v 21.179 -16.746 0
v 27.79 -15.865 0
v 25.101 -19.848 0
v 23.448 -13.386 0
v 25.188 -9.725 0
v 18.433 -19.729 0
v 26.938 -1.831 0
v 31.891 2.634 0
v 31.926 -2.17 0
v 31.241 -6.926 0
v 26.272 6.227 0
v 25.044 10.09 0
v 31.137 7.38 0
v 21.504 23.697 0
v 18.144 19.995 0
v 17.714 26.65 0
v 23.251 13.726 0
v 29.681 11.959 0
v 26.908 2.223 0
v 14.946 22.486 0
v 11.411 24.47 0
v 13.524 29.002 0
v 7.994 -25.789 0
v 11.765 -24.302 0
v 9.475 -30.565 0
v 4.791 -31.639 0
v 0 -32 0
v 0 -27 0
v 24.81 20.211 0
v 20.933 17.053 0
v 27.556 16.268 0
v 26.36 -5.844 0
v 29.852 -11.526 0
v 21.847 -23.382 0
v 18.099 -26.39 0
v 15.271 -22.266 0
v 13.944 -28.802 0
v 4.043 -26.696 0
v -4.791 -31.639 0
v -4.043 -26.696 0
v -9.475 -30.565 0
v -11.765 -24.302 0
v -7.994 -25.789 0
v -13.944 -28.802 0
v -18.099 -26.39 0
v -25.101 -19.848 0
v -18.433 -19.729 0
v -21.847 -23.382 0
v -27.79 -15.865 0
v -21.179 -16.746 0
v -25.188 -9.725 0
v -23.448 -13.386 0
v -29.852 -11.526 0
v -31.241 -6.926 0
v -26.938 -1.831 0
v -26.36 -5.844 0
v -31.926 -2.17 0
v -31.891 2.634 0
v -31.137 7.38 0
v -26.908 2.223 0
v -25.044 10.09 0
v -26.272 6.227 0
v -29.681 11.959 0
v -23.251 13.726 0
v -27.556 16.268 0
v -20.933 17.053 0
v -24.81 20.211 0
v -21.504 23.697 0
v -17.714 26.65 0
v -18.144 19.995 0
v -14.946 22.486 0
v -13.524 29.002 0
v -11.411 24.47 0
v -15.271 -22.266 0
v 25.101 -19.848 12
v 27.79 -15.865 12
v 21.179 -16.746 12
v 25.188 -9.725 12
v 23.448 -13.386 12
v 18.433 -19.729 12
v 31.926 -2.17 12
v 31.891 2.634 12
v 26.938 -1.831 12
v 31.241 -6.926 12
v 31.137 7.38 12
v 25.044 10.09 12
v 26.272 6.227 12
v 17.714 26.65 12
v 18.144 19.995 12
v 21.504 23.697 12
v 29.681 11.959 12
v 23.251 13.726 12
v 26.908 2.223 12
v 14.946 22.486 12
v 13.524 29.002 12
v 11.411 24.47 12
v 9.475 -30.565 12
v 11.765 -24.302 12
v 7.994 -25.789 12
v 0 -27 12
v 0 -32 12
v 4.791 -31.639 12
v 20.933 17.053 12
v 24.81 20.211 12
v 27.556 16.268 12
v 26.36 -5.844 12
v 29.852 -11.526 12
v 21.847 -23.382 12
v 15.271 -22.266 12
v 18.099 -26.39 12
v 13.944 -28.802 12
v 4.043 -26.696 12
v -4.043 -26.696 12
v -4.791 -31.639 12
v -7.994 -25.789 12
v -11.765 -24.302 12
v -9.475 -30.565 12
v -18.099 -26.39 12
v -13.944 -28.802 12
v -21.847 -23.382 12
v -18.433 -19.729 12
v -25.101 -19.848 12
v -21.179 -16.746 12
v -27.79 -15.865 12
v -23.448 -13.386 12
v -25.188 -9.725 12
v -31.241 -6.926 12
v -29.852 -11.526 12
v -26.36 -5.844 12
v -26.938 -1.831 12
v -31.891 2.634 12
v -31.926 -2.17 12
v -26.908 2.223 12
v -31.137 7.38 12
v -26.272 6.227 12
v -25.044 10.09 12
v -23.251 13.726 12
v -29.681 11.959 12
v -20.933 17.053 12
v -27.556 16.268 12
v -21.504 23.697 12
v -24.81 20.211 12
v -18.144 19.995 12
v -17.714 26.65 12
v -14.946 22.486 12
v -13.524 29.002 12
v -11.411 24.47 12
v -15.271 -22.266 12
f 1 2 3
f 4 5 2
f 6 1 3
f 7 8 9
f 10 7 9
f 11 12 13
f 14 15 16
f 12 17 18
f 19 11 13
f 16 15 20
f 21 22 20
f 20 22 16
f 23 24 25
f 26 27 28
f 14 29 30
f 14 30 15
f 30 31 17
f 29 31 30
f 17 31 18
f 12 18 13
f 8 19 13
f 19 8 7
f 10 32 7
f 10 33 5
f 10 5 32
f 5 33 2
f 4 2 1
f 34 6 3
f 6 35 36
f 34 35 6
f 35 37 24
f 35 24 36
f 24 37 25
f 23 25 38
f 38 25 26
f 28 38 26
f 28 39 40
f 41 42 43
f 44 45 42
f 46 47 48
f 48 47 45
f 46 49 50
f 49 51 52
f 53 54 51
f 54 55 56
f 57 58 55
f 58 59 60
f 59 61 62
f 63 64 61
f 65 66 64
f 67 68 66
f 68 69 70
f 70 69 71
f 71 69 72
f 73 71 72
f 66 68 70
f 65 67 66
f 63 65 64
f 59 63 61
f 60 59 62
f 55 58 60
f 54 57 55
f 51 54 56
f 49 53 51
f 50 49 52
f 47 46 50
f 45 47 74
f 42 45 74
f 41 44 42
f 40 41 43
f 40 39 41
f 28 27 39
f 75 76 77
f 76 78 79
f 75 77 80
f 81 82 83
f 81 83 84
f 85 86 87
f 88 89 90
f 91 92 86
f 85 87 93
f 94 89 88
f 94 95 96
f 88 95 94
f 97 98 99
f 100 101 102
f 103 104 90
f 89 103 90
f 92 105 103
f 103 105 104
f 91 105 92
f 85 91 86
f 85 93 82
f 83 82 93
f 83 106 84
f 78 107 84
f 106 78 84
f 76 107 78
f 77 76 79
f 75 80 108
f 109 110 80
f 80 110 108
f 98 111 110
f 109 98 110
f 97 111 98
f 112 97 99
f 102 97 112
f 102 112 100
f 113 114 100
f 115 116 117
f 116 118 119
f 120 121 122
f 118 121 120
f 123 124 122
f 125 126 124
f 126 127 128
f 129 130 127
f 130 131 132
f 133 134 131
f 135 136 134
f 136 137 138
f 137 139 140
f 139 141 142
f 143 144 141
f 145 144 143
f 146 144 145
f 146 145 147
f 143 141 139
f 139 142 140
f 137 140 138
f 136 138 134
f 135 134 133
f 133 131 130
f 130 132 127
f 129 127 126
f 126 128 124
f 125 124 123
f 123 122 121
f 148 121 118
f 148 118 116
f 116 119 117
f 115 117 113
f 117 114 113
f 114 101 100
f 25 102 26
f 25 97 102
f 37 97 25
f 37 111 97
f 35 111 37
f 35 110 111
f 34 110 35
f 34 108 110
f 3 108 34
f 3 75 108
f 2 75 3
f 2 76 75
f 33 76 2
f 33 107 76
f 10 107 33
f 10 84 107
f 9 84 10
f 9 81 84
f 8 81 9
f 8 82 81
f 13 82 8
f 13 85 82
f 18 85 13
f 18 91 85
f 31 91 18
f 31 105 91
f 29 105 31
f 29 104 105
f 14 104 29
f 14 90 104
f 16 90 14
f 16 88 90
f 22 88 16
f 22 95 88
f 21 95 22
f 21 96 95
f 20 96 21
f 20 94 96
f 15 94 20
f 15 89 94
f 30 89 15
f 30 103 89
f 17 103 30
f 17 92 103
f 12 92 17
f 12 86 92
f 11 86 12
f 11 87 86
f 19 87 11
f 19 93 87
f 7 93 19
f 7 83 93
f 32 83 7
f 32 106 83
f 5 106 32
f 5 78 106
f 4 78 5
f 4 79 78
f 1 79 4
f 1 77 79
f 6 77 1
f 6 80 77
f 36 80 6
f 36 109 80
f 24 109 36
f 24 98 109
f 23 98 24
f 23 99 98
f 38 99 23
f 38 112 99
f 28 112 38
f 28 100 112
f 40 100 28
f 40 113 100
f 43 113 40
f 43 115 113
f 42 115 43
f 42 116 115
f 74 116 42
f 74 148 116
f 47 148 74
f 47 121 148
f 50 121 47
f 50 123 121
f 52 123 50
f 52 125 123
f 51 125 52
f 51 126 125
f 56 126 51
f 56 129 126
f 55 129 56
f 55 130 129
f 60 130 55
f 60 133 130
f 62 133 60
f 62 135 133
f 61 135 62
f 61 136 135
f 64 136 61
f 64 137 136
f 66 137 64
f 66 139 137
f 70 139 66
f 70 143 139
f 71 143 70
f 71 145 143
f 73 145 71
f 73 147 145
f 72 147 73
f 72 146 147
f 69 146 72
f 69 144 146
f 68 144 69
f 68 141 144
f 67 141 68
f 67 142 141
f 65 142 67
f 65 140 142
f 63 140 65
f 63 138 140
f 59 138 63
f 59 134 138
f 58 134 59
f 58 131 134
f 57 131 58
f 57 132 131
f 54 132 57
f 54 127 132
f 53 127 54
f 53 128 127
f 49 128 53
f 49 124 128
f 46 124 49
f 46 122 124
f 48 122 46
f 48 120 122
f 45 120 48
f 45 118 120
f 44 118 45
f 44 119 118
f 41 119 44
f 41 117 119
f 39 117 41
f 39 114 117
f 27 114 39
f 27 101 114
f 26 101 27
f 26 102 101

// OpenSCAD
$fn = 32;

// ----------------------------------------------------------------------
// Spring clip: 64 mm outside, 5 mm band, 50 degree opening
// ----------------------------------------------------------------------

// --- parameters (mm) ---
outer_r = 32;             // clip outside radius
inner_r = 27;             // clip bore radius
band = 5;                 // band thickness
clip_w = 12;              // clip width
opening = 50;             // opening angle

clip_profile = [[-13.524, 29.002], [-17.714, 26.65], [-21.504, 23.697], [-24.81, 20.211], [-27.556, 16.268], [-29.681, 11.959], [-31.137, 7.38], [-31.891, 2.634], [-31.926, -2.17], [-31.241, -6.926], [-29.852, -11.526], [-27.79, -15.865], [-25.101, -19.848], [-21.847, -23.382], [-18.099, -26.39], [-13.944, -28.802], [-9.475, -30.565], [-4.791, -31.639], [0, -32], [4.791, -31.639], [9.475, -30.565], [13.944, -28.802], [18.099, -26.39], [21.847, -23.382], [25.101, -19.848], [27.79, -15.865], [29.852, -11.526], [31.241, -6.926], [31.926, -2.17], [31.891, 2.634], [31.137, 7.38], [29.681, 11.959], [27.556, 16.268], [24.81, 20.211], [21.504, 23.697], [17.714, 26.65], [13.524, 29.002], [11.411, 24.47], [14.946, 22.486], [18.144, 19.995], [20.933, 17.053], [23.251, 13.726], [25.044, 10.09], [26.272, 6.227], [26.908, 2.223], [26.938, -1.831], [26.36, -5.844], [25.188, -9.725], [23.448, -13.386], [21.179, -16.746], [18.433, -19.729], [15.271, -22.266], [11.765, -24.302], [7.994, -25.789], [4.043, -26.696], [0, -27], [-4.043, -26.696], [-7.994, -25.789], [-11.765, -24.302], [-15.271, -22.266], [-18.433, -19.729], [-21.179, -16.746], [-23.448, -13.386], [-25.188, -9.725], [-26.36, -5.844], [-26.938, -1.831], [-26.908, 2.223], [-26.272, 6.227], [-25.044, 10.09], [-23.251, 13.726], [-20.933, 17.053], [-18.144, 19.995], [-14.946, 22.486], [-11.411, 24.47]];

difference() {
  union() {
    linear_extrude(height = clip_w) polygon(clip_profile);
  }
}
